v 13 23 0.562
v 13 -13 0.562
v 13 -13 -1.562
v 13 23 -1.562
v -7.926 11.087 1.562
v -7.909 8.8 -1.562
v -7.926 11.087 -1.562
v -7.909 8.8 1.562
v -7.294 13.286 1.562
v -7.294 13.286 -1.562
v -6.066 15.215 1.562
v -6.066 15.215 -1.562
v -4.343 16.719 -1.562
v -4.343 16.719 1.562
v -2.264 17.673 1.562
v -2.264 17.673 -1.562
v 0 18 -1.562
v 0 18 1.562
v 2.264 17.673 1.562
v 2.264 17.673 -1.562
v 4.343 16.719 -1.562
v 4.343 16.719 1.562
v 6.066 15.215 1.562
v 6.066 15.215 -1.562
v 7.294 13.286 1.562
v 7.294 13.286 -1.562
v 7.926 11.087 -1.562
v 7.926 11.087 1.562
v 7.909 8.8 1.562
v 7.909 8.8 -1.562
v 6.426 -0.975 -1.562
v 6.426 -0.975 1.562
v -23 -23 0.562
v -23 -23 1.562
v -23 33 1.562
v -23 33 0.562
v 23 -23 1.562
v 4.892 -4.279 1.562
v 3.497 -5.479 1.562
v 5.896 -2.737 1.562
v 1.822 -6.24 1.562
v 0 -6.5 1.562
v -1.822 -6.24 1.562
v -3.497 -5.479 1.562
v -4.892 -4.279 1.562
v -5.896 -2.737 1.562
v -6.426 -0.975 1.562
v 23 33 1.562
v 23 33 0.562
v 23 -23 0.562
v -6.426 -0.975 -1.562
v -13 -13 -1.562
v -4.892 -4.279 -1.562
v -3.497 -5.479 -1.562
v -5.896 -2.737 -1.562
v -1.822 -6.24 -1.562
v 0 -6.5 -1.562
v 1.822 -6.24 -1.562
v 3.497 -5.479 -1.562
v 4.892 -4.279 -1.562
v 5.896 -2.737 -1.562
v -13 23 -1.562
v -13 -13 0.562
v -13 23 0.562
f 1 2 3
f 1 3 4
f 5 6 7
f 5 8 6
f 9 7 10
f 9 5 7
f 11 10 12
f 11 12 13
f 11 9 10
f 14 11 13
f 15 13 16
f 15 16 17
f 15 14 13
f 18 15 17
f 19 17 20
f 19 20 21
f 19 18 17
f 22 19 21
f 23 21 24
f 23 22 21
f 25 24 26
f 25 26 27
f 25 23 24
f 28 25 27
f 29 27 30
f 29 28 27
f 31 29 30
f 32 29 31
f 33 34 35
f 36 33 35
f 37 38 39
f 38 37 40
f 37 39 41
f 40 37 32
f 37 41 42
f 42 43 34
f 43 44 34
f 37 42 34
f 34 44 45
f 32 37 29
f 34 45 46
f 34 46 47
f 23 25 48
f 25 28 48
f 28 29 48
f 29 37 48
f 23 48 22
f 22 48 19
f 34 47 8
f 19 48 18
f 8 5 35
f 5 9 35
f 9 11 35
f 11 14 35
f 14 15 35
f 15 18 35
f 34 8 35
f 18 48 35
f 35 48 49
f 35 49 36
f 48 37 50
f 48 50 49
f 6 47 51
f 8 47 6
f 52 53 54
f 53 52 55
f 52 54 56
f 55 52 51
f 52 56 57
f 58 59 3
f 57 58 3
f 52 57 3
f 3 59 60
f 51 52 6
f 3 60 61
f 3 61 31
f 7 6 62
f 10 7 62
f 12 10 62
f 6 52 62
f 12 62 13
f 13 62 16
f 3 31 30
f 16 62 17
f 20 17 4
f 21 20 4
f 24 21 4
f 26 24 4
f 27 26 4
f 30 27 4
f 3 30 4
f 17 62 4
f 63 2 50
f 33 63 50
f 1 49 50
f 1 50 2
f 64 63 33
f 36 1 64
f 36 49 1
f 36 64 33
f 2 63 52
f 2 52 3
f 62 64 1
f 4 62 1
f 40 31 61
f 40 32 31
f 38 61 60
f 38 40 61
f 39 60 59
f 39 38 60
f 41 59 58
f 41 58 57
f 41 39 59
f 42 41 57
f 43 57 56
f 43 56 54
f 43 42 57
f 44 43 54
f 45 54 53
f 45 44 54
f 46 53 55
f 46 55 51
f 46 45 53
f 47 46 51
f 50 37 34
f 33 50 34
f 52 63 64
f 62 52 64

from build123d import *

# Parameters (mm, degrees)
SKETCH1_W           = 26
SKETCH1_H           = 36
BOSS_EXTRUDE1_DEPTH = 1.5625
SKETCH2_W           = 46
SKETCH2_H           = 56
SKETCH2_W_2         = 26
SKETCH2_H_2         = 36
BOSS_EXTRUDE2_DEPTH = 1


with BuildPart() as part:
    # Sketch1 → Boss-Extrude1 (new, symmetric)
    with BuildSketch(Plane.XY):
        with Locations((0, 5)):
            Rectangle(SKETCH1_W, SKETCH1_H)
        with BuildLine():
            Line((-6.426458978, -0.975), (-7.909487973, 8.8))
            ThreePointArc((-7.909487973, 8.8), (0, 18), (7.909487973, 8.8))
            Line((7.909487973, 8.8), (6.426458978, -0.975))
            ThreePointArc((6.426458978, -0.975), (0, -6.5), (-6.426458978, -0.975))
        make_face(mode=Mode.SUBTRACT)
    extrude(amount=BOSS_EXTRUDE1_DEPTH, both=True)

    # Sketch2 → Boss-Extrude2 (add)
    with BuildSketch(Plane(origin=(0, 0, 1.5625), x_dir=(-1, 0, 0), z_dir=(0, 0, -1))):
        with Locations((0, 5)):
            Rectangle(SKETCH2_W, SKETCH2_H)
        with Locations((0, 5)):
            Rectangle(SKETCH2_W_2, SKETCH2_H_2, mode=Mode.SUBTRACT)
    extrude(amount=BOSS_EXTRUDE2_DEPTH)


solid = part.part
